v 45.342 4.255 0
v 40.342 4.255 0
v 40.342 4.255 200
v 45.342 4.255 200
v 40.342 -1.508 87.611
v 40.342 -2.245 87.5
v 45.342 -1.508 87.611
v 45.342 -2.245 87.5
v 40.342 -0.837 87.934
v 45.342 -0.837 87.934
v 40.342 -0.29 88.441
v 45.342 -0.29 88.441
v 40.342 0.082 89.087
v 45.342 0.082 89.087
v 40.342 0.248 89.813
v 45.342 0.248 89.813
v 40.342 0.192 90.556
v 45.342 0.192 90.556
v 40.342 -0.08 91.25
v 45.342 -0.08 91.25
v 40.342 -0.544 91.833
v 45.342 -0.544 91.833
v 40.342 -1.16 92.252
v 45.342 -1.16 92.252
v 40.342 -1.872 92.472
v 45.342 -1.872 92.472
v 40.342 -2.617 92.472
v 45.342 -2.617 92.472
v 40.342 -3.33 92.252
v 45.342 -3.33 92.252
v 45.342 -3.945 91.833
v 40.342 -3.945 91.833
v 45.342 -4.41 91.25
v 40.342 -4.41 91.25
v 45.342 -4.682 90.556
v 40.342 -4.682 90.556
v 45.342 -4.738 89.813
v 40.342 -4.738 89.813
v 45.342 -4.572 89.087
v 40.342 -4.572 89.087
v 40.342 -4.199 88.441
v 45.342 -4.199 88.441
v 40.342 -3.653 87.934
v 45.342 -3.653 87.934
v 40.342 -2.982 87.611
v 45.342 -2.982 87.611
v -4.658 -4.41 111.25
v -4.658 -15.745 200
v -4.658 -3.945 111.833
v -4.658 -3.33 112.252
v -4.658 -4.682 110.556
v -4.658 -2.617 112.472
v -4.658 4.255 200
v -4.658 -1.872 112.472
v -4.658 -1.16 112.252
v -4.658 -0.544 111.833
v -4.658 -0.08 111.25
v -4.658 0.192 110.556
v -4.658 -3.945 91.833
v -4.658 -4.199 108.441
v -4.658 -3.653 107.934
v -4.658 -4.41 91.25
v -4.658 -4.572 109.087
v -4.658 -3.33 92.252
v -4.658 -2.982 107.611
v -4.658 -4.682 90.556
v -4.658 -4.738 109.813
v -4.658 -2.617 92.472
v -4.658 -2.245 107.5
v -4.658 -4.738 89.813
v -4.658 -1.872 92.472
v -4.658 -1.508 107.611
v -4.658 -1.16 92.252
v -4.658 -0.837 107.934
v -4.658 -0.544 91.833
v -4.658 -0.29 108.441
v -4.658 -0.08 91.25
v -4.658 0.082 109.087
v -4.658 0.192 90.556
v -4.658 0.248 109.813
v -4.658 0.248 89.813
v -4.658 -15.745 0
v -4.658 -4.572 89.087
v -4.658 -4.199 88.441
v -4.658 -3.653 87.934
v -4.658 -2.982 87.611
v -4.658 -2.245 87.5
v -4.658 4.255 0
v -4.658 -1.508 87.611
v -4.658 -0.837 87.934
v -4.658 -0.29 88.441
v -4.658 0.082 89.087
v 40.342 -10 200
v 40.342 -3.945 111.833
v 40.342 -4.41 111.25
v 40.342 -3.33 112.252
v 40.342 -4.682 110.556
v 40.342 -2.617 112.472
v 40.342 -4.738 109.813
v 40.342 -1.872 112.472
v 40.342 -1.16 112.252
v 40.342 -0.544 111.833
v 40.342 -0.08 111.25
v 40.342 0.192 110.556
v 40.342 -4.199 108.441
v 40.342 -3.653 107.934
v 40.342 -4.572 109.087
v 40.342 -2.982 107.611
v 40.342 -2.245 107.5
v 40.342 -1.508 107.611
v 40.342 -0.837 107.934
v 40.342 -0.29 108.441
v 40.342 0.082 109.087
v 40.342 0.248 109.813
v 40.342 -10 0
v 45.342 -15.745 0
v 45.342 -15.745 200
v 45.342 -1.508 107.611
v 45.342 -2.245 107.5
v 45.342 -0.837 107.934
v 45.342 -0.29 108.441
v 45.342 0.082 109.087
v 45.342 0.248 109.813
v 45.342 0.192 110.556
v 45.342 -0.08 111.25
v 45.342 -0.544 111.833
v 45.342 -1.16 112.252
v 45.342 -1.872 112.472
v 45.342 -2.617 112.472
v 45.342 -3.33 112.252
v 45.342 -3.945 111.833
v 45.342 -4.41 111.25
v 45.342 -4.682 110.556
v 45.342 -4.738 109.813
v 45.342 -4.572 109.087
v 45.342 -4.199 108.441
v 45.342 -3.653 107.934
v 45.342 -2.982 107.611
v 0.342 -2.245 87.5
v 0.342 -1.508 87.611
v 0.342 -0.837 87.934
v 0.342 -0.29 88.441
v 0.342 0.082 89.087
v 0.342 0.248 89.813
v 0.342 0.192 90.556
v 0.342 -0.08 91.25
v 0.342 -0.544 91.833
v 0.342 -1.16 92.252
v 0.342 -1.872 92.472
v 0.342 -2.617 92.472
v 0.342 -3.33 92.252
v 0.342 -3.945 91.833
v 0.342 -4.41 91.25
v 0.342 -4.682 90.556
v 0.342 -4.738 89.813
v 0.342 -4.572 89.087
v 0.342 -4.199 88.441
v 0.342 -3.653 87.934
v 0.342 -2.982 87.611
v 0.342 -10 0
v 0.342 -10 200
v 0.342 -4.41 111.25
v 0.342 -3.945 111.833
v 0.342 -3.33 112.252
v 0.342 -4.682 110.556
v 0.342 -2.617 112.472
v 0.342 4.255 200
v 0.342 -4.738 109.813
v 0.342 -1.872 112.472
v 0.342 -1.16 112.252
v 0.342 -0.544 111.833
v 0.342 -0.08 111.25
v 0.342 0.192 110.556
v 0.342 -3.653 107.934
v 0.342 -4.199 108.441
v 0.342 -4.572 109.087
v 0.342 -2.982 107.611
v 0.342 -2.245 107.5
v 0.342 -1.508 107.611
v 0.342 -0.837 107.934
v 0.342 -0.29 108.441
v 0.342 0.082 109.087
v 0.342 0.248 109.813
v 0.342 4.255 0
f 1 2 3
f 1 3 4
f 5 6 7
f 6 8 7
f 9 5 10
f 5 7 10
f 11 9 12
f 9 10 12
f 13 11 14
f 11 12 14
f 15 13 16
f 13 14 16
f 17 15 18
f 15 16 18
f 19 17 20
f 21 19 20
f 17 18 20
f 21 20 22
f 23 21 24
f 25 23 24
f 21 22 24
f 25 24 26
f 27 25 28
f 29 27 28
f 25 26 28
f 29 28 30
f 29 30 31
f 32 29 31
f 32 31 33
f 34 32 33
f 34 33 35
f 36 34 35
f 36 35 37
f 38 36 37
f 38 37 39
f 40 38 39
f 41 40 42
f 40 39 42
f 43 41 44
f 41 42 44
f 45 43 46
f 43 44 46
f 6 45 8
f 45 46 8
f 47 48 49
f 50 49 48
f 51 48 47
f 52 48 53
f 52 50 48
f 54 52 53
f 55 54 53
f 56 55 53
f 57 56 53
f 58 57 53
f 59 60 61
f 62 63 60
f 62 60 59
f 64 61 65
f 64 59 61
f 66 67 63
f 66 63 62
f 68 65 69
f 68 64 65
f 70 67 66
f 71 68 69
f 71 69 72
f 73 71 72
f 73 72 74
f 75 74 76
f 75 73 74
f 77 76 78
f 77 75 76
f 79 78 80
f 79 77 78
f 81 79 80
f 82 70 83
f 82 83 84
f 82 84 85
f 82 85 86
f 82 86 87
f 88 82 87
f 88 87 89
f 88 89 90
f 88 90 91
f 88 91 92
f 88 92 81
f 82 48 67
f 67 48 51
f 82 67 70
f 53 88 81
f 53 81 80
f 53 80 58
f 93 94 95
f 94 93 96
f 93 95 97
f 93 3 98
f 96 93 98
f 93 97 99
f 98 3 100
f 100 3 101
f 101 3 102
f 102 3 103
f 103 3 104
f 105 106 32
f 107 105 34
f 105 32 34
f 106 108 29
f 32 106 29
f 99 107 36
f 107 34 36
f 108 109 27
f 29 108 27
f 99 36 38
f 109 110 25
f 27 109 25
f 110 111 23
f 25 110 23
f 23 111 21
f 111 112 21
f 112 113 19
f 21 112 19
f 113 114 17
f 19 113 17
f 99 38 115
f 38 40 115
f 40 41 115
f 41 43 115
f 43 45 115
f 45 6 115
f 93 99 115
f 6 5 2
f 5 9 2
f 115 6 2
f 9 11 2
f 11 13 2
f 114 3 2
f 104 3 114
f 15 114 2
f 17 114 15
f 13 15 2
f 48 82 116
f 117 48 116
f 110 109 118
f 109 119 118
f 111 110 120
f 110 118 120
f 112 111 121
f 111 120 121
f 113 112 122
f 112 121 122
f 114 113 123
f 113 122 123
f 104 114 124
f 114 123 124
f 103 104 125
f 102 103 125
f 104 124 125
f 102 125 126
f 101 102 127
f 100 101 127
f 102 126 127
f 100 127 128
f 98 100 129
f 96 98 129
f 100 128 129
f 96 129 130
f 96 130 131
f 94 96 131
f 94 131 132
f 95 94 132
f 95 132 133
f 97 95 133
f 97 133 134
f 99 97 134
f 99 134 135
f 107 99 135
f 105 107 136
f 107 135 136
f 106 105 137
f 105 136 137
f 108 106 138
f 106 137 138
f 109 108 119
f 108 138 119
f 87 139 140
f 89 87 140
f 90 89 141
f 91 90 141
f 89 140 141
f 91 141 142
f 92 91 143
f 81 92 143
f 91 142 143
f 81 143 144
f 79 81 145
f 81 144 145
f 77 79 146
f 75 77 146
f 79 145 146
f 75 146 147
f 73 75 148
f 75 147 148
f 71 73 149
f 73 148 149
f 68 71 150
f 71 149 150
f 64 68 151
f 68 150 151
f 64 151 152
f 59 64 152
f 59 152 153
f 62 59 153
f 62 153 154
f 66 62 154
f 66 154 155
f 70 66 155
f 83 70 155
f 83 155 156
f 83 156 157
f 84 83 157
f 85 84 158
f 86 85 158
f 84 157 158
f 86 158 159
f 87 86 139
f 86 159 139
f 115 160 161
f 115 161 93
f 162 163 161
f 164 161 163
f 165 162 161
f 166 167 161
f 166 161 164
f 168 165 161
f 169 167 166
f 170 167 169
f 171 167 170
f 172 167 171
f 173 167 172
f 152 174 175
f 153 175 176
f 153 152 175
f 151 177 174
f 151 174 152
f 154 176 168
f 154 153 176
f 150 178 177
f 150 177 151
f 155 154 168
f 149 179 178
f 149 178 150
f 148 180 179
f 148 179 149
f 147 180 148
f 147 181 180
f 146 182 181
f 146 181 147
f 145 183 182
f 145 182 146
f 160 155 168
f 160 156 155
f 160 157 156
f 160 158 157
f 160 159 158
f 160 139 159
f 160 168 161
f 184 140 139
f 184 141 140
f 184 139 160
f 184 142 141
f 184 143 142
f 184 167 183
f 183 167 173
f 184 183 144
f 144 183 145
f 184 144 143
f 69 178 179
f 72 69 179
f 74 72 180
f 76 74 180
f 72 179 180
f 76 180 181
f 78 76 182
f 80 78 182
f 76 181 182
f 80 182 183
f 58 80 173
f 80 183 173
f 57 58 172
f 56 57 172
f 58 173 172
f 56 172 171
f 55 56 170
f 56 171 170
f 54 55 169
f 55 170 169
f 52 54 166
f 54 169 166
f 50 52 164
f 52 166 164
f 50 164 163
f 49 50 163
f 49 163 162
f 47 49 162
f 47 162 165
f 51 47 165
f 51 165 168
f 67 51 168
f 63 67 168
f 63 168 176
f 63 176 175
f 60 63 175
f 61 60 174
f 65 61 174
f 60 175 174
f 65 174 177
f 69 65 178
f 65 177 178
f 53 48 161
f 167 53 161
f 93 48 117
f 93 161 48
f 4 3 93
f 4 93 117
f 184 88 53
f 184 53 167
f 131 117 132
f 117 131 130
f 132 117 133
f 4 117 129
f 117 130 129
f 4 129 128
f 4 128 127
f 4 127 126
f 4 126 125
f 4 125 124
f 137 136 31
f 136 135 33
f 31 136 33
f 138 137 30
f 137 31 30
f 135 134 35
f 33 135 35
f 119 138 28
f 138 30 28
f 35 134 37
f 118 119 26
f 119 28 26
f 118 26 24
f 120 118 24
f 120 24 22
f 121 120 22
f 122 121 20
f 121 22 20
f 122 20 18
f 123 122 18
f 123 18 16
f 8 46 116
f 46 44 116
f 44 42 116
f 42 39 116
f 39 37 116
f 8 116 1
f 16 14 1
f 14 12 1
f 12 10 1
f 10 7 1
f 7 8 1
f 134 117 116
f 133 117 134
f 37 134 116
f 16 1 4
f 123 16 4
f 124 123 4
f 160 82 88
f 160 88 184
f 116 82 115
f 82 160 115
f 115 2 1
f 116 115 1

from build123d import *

# Parameters (mm, degrees)
SKIZZE1_W                            = 50
SKIZZE1_H                            = 20
AUFSATZ_LINEAR_AUSTRAGEN1_DEPTH      = 200
SKIZZE3_R                            = 2.5
SCHNITT_LINEAR_AUSTRAGEN1_DEPTH      = 46.342127859
SCHNITT_LINEAR_AUSTRAGEN1_DEPTH_BACK = 5.657872141
SCHNITT_LINEAR_START                 = 10
SKIZZE4_W                            = 40
SKIZZE4_H                            = 200
SCHNITT_LINEAR_AUSTRAGEN2_DEPTH      = 20


with BuildPart() as part:
    # Skizze1 → Aufsatz-Linear austragen1 (new body)
    with BuildSketch(Plane.XY):
        with Locations((20.342127859, -5.74485208)):
            Rectangle(SKIZZE1_W, SKIZZE1_H)
    extrude(amount=AUFSATZ_LINEAR_AUSTRAGEN1_DEPTH)

    # Skizze3 → Schnitt-Linear austragen1 (cut, two sides)
    with BuildSketch(Plane(origin=(0, 0, 0), x_dir=(0, 0, -1), z_dir=(1, 0, 0))) as schnitt_linear_austragen1_sk:
        with Locations((-90, -2.24485208)):
            Circle(SKIZZE3_R)
        with Locations((-110, -2.24485208)):
            Circle(SKIZZE3_R)
    extrude(amount=SCHNITT_LINEAR_AUSTRAGEN1_DEPTH, mode=Mode.SUBTRACT)
    extrude(schnitt_linear_austragen1_sk.sketch, amount=-SCHNITT_LINEAR_AUSTRAGEN1_DEPTH_BACK, mode=Mode.SUBTRACT)

    # Skizze4 → Schnitt-Linear austragen2 (cut)
    with BuildSketch(Plane(origin=(0, 0, 0), x_dir=(1, 0, 0), z_dir=(0, 1, 0)).offset(SCHNITT_LINEAR_START)):
        with Locations((20.342127859, -100)):
            Rectangle(SKIZZE4_W, SKIZZE4_H)
    extrude(amount=-SCHNITT_LINEAR_AUSTRAGEN2_DEPTH, mode=Mode.SUBTRACT)


solid = part.part
